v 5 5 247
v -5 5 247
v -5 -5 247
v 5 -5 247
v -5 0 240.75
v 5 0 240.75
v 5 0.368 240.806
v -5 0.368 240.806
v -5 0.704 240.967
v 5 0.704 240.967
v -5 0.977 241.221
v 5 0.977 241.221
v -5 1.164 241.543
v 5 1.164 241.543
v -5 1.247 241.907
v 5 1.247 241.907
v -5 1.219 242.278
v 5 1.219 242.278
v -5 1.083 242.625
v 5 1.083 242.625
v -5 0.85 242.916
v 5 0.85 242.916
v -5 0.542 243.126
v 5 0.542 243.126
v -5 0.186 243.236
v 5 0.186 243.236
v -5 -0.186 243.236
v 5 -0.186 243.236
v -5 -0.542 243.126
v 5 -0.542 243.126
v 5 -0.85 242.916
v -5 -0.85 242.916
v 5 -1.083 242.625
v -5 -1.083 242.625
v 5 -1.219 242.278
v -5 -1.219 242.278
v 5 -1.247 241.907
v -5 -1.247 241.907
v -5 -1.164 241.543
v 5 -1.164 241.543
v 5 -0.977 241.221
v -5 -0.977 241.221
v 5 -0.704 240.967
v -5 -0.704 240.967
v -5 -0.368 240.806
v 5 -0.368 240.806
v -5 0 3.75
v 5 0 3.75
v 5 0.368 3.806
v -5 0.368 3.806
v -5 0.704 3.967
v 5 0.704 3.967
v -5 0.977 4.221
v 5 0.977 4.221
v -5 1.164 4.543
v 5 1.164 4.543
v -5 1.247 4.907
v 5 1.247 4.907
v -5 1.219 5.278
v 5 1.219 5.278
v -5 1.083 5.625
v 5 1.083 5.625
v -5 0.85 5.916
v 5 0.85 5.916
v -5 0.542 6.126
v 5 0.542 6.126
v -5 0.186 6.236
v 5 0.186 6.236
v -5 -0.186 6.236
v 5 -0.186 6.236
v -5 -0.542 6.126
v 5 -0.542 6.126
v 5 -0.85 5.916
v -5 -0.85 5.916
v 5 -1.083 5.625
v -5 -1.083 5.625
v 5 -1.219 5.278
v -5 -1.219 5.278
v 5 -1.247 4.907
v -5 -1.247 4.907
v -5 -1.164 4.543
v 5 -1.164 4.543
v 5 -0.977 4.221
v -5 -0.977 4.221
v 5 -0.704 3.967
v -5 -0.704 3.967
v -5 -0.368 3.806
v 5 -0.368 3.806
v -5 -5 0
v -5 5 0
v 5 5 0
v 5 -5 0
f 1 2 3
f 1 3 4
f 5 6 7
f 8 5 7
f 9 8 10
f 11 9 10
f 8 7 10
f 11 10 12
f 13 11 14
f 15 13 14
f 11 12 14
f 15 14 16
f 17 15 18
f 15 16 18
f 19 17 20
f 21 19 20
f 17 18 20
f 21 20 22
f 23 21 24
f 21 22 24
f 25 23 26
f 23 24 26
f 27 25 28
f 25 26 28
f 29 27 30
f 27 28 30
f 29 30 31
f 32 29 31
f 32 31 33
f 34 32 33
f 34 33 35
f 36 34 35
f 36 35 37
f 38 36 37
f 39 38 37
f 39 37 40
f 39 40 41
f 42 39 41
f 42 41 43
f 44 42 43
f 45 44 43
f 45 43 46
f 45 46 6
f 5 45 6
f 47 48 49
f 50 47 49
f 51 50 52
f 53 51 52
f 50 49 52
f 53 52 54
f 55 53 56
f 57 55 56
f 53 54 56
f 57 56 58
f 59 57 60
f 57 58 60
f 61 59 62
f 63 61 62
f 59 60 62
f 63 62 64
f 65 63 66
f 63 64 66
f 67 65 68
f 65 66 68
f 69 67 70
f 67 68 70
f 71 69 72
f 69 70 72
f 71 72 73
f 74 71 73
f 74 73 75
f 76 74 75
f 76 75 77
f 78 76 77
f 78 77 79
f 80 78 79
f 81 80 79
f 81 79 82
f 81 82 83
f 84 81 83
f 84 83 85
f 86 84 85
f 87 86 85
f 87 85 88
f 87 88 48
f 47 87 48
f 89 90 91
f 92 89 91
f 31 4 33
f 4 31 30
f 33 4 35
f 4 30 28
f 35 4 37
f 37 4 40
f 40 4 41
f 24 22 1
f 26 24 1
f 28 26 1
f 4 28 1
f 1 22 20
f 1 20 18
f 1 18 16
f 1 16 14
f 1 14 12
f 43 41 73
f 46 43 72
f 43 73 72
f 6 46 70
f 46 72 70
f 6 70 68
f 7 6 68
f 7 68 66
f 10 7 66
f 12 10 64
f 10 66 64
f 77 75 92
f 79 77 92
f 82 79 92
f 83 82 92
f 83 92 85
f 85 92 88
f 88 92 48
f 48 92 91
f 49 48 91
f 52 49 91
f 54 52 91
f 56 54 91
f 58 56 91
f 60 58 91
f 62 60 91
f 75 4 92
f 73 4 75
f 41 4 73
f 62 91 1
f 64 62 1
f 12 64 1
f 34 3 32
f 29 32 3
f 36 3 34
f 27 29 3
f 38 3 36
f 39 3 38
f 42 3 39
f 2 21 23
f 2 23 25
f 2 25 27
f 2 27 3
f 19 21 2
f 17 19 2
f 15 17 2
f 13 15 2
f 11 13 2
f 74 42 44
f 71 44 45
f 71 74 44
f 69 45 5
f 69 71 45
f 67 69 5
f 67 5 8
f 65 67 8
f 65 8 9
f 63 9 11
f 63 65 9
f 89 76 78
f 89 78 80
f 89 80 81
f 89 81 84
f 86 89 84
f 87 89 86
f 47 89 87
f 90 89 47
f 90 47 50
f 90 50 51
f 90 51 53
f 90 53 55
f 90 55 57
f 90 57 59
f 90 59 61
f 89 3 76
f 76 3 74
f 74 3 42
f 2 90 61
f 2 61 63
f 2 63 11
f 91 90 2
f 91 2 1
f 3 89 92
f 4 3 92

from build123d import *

# Parameters (mm, degrees)
ESQUISSE1_W           = 10
ESQUISSE1_H           = 10
BOSS_EXTRU_1_DEPTH    = 247
TROU_TARAUD_M3X0_51_D = 2.5


with BuildPart() as part:
    # Esquisse1 → Boss.-Extru.1 (new body)
    with BuildSketch(Plane.XY):
        Rectangle(ESQUISSE1_W, ESQUISSE1_H)
    extrude(amount=BOSS_EXTRU_1_DEPTH)

    # Trou taraudé M3x0.51 (through all)
    with Locations(Plane.ZY.offset(5)):
        with Locations((242, 0), (5, 0)):
            Hole(TROU_TARAUD_M3X0_51_D / 2)


solid = part.part
